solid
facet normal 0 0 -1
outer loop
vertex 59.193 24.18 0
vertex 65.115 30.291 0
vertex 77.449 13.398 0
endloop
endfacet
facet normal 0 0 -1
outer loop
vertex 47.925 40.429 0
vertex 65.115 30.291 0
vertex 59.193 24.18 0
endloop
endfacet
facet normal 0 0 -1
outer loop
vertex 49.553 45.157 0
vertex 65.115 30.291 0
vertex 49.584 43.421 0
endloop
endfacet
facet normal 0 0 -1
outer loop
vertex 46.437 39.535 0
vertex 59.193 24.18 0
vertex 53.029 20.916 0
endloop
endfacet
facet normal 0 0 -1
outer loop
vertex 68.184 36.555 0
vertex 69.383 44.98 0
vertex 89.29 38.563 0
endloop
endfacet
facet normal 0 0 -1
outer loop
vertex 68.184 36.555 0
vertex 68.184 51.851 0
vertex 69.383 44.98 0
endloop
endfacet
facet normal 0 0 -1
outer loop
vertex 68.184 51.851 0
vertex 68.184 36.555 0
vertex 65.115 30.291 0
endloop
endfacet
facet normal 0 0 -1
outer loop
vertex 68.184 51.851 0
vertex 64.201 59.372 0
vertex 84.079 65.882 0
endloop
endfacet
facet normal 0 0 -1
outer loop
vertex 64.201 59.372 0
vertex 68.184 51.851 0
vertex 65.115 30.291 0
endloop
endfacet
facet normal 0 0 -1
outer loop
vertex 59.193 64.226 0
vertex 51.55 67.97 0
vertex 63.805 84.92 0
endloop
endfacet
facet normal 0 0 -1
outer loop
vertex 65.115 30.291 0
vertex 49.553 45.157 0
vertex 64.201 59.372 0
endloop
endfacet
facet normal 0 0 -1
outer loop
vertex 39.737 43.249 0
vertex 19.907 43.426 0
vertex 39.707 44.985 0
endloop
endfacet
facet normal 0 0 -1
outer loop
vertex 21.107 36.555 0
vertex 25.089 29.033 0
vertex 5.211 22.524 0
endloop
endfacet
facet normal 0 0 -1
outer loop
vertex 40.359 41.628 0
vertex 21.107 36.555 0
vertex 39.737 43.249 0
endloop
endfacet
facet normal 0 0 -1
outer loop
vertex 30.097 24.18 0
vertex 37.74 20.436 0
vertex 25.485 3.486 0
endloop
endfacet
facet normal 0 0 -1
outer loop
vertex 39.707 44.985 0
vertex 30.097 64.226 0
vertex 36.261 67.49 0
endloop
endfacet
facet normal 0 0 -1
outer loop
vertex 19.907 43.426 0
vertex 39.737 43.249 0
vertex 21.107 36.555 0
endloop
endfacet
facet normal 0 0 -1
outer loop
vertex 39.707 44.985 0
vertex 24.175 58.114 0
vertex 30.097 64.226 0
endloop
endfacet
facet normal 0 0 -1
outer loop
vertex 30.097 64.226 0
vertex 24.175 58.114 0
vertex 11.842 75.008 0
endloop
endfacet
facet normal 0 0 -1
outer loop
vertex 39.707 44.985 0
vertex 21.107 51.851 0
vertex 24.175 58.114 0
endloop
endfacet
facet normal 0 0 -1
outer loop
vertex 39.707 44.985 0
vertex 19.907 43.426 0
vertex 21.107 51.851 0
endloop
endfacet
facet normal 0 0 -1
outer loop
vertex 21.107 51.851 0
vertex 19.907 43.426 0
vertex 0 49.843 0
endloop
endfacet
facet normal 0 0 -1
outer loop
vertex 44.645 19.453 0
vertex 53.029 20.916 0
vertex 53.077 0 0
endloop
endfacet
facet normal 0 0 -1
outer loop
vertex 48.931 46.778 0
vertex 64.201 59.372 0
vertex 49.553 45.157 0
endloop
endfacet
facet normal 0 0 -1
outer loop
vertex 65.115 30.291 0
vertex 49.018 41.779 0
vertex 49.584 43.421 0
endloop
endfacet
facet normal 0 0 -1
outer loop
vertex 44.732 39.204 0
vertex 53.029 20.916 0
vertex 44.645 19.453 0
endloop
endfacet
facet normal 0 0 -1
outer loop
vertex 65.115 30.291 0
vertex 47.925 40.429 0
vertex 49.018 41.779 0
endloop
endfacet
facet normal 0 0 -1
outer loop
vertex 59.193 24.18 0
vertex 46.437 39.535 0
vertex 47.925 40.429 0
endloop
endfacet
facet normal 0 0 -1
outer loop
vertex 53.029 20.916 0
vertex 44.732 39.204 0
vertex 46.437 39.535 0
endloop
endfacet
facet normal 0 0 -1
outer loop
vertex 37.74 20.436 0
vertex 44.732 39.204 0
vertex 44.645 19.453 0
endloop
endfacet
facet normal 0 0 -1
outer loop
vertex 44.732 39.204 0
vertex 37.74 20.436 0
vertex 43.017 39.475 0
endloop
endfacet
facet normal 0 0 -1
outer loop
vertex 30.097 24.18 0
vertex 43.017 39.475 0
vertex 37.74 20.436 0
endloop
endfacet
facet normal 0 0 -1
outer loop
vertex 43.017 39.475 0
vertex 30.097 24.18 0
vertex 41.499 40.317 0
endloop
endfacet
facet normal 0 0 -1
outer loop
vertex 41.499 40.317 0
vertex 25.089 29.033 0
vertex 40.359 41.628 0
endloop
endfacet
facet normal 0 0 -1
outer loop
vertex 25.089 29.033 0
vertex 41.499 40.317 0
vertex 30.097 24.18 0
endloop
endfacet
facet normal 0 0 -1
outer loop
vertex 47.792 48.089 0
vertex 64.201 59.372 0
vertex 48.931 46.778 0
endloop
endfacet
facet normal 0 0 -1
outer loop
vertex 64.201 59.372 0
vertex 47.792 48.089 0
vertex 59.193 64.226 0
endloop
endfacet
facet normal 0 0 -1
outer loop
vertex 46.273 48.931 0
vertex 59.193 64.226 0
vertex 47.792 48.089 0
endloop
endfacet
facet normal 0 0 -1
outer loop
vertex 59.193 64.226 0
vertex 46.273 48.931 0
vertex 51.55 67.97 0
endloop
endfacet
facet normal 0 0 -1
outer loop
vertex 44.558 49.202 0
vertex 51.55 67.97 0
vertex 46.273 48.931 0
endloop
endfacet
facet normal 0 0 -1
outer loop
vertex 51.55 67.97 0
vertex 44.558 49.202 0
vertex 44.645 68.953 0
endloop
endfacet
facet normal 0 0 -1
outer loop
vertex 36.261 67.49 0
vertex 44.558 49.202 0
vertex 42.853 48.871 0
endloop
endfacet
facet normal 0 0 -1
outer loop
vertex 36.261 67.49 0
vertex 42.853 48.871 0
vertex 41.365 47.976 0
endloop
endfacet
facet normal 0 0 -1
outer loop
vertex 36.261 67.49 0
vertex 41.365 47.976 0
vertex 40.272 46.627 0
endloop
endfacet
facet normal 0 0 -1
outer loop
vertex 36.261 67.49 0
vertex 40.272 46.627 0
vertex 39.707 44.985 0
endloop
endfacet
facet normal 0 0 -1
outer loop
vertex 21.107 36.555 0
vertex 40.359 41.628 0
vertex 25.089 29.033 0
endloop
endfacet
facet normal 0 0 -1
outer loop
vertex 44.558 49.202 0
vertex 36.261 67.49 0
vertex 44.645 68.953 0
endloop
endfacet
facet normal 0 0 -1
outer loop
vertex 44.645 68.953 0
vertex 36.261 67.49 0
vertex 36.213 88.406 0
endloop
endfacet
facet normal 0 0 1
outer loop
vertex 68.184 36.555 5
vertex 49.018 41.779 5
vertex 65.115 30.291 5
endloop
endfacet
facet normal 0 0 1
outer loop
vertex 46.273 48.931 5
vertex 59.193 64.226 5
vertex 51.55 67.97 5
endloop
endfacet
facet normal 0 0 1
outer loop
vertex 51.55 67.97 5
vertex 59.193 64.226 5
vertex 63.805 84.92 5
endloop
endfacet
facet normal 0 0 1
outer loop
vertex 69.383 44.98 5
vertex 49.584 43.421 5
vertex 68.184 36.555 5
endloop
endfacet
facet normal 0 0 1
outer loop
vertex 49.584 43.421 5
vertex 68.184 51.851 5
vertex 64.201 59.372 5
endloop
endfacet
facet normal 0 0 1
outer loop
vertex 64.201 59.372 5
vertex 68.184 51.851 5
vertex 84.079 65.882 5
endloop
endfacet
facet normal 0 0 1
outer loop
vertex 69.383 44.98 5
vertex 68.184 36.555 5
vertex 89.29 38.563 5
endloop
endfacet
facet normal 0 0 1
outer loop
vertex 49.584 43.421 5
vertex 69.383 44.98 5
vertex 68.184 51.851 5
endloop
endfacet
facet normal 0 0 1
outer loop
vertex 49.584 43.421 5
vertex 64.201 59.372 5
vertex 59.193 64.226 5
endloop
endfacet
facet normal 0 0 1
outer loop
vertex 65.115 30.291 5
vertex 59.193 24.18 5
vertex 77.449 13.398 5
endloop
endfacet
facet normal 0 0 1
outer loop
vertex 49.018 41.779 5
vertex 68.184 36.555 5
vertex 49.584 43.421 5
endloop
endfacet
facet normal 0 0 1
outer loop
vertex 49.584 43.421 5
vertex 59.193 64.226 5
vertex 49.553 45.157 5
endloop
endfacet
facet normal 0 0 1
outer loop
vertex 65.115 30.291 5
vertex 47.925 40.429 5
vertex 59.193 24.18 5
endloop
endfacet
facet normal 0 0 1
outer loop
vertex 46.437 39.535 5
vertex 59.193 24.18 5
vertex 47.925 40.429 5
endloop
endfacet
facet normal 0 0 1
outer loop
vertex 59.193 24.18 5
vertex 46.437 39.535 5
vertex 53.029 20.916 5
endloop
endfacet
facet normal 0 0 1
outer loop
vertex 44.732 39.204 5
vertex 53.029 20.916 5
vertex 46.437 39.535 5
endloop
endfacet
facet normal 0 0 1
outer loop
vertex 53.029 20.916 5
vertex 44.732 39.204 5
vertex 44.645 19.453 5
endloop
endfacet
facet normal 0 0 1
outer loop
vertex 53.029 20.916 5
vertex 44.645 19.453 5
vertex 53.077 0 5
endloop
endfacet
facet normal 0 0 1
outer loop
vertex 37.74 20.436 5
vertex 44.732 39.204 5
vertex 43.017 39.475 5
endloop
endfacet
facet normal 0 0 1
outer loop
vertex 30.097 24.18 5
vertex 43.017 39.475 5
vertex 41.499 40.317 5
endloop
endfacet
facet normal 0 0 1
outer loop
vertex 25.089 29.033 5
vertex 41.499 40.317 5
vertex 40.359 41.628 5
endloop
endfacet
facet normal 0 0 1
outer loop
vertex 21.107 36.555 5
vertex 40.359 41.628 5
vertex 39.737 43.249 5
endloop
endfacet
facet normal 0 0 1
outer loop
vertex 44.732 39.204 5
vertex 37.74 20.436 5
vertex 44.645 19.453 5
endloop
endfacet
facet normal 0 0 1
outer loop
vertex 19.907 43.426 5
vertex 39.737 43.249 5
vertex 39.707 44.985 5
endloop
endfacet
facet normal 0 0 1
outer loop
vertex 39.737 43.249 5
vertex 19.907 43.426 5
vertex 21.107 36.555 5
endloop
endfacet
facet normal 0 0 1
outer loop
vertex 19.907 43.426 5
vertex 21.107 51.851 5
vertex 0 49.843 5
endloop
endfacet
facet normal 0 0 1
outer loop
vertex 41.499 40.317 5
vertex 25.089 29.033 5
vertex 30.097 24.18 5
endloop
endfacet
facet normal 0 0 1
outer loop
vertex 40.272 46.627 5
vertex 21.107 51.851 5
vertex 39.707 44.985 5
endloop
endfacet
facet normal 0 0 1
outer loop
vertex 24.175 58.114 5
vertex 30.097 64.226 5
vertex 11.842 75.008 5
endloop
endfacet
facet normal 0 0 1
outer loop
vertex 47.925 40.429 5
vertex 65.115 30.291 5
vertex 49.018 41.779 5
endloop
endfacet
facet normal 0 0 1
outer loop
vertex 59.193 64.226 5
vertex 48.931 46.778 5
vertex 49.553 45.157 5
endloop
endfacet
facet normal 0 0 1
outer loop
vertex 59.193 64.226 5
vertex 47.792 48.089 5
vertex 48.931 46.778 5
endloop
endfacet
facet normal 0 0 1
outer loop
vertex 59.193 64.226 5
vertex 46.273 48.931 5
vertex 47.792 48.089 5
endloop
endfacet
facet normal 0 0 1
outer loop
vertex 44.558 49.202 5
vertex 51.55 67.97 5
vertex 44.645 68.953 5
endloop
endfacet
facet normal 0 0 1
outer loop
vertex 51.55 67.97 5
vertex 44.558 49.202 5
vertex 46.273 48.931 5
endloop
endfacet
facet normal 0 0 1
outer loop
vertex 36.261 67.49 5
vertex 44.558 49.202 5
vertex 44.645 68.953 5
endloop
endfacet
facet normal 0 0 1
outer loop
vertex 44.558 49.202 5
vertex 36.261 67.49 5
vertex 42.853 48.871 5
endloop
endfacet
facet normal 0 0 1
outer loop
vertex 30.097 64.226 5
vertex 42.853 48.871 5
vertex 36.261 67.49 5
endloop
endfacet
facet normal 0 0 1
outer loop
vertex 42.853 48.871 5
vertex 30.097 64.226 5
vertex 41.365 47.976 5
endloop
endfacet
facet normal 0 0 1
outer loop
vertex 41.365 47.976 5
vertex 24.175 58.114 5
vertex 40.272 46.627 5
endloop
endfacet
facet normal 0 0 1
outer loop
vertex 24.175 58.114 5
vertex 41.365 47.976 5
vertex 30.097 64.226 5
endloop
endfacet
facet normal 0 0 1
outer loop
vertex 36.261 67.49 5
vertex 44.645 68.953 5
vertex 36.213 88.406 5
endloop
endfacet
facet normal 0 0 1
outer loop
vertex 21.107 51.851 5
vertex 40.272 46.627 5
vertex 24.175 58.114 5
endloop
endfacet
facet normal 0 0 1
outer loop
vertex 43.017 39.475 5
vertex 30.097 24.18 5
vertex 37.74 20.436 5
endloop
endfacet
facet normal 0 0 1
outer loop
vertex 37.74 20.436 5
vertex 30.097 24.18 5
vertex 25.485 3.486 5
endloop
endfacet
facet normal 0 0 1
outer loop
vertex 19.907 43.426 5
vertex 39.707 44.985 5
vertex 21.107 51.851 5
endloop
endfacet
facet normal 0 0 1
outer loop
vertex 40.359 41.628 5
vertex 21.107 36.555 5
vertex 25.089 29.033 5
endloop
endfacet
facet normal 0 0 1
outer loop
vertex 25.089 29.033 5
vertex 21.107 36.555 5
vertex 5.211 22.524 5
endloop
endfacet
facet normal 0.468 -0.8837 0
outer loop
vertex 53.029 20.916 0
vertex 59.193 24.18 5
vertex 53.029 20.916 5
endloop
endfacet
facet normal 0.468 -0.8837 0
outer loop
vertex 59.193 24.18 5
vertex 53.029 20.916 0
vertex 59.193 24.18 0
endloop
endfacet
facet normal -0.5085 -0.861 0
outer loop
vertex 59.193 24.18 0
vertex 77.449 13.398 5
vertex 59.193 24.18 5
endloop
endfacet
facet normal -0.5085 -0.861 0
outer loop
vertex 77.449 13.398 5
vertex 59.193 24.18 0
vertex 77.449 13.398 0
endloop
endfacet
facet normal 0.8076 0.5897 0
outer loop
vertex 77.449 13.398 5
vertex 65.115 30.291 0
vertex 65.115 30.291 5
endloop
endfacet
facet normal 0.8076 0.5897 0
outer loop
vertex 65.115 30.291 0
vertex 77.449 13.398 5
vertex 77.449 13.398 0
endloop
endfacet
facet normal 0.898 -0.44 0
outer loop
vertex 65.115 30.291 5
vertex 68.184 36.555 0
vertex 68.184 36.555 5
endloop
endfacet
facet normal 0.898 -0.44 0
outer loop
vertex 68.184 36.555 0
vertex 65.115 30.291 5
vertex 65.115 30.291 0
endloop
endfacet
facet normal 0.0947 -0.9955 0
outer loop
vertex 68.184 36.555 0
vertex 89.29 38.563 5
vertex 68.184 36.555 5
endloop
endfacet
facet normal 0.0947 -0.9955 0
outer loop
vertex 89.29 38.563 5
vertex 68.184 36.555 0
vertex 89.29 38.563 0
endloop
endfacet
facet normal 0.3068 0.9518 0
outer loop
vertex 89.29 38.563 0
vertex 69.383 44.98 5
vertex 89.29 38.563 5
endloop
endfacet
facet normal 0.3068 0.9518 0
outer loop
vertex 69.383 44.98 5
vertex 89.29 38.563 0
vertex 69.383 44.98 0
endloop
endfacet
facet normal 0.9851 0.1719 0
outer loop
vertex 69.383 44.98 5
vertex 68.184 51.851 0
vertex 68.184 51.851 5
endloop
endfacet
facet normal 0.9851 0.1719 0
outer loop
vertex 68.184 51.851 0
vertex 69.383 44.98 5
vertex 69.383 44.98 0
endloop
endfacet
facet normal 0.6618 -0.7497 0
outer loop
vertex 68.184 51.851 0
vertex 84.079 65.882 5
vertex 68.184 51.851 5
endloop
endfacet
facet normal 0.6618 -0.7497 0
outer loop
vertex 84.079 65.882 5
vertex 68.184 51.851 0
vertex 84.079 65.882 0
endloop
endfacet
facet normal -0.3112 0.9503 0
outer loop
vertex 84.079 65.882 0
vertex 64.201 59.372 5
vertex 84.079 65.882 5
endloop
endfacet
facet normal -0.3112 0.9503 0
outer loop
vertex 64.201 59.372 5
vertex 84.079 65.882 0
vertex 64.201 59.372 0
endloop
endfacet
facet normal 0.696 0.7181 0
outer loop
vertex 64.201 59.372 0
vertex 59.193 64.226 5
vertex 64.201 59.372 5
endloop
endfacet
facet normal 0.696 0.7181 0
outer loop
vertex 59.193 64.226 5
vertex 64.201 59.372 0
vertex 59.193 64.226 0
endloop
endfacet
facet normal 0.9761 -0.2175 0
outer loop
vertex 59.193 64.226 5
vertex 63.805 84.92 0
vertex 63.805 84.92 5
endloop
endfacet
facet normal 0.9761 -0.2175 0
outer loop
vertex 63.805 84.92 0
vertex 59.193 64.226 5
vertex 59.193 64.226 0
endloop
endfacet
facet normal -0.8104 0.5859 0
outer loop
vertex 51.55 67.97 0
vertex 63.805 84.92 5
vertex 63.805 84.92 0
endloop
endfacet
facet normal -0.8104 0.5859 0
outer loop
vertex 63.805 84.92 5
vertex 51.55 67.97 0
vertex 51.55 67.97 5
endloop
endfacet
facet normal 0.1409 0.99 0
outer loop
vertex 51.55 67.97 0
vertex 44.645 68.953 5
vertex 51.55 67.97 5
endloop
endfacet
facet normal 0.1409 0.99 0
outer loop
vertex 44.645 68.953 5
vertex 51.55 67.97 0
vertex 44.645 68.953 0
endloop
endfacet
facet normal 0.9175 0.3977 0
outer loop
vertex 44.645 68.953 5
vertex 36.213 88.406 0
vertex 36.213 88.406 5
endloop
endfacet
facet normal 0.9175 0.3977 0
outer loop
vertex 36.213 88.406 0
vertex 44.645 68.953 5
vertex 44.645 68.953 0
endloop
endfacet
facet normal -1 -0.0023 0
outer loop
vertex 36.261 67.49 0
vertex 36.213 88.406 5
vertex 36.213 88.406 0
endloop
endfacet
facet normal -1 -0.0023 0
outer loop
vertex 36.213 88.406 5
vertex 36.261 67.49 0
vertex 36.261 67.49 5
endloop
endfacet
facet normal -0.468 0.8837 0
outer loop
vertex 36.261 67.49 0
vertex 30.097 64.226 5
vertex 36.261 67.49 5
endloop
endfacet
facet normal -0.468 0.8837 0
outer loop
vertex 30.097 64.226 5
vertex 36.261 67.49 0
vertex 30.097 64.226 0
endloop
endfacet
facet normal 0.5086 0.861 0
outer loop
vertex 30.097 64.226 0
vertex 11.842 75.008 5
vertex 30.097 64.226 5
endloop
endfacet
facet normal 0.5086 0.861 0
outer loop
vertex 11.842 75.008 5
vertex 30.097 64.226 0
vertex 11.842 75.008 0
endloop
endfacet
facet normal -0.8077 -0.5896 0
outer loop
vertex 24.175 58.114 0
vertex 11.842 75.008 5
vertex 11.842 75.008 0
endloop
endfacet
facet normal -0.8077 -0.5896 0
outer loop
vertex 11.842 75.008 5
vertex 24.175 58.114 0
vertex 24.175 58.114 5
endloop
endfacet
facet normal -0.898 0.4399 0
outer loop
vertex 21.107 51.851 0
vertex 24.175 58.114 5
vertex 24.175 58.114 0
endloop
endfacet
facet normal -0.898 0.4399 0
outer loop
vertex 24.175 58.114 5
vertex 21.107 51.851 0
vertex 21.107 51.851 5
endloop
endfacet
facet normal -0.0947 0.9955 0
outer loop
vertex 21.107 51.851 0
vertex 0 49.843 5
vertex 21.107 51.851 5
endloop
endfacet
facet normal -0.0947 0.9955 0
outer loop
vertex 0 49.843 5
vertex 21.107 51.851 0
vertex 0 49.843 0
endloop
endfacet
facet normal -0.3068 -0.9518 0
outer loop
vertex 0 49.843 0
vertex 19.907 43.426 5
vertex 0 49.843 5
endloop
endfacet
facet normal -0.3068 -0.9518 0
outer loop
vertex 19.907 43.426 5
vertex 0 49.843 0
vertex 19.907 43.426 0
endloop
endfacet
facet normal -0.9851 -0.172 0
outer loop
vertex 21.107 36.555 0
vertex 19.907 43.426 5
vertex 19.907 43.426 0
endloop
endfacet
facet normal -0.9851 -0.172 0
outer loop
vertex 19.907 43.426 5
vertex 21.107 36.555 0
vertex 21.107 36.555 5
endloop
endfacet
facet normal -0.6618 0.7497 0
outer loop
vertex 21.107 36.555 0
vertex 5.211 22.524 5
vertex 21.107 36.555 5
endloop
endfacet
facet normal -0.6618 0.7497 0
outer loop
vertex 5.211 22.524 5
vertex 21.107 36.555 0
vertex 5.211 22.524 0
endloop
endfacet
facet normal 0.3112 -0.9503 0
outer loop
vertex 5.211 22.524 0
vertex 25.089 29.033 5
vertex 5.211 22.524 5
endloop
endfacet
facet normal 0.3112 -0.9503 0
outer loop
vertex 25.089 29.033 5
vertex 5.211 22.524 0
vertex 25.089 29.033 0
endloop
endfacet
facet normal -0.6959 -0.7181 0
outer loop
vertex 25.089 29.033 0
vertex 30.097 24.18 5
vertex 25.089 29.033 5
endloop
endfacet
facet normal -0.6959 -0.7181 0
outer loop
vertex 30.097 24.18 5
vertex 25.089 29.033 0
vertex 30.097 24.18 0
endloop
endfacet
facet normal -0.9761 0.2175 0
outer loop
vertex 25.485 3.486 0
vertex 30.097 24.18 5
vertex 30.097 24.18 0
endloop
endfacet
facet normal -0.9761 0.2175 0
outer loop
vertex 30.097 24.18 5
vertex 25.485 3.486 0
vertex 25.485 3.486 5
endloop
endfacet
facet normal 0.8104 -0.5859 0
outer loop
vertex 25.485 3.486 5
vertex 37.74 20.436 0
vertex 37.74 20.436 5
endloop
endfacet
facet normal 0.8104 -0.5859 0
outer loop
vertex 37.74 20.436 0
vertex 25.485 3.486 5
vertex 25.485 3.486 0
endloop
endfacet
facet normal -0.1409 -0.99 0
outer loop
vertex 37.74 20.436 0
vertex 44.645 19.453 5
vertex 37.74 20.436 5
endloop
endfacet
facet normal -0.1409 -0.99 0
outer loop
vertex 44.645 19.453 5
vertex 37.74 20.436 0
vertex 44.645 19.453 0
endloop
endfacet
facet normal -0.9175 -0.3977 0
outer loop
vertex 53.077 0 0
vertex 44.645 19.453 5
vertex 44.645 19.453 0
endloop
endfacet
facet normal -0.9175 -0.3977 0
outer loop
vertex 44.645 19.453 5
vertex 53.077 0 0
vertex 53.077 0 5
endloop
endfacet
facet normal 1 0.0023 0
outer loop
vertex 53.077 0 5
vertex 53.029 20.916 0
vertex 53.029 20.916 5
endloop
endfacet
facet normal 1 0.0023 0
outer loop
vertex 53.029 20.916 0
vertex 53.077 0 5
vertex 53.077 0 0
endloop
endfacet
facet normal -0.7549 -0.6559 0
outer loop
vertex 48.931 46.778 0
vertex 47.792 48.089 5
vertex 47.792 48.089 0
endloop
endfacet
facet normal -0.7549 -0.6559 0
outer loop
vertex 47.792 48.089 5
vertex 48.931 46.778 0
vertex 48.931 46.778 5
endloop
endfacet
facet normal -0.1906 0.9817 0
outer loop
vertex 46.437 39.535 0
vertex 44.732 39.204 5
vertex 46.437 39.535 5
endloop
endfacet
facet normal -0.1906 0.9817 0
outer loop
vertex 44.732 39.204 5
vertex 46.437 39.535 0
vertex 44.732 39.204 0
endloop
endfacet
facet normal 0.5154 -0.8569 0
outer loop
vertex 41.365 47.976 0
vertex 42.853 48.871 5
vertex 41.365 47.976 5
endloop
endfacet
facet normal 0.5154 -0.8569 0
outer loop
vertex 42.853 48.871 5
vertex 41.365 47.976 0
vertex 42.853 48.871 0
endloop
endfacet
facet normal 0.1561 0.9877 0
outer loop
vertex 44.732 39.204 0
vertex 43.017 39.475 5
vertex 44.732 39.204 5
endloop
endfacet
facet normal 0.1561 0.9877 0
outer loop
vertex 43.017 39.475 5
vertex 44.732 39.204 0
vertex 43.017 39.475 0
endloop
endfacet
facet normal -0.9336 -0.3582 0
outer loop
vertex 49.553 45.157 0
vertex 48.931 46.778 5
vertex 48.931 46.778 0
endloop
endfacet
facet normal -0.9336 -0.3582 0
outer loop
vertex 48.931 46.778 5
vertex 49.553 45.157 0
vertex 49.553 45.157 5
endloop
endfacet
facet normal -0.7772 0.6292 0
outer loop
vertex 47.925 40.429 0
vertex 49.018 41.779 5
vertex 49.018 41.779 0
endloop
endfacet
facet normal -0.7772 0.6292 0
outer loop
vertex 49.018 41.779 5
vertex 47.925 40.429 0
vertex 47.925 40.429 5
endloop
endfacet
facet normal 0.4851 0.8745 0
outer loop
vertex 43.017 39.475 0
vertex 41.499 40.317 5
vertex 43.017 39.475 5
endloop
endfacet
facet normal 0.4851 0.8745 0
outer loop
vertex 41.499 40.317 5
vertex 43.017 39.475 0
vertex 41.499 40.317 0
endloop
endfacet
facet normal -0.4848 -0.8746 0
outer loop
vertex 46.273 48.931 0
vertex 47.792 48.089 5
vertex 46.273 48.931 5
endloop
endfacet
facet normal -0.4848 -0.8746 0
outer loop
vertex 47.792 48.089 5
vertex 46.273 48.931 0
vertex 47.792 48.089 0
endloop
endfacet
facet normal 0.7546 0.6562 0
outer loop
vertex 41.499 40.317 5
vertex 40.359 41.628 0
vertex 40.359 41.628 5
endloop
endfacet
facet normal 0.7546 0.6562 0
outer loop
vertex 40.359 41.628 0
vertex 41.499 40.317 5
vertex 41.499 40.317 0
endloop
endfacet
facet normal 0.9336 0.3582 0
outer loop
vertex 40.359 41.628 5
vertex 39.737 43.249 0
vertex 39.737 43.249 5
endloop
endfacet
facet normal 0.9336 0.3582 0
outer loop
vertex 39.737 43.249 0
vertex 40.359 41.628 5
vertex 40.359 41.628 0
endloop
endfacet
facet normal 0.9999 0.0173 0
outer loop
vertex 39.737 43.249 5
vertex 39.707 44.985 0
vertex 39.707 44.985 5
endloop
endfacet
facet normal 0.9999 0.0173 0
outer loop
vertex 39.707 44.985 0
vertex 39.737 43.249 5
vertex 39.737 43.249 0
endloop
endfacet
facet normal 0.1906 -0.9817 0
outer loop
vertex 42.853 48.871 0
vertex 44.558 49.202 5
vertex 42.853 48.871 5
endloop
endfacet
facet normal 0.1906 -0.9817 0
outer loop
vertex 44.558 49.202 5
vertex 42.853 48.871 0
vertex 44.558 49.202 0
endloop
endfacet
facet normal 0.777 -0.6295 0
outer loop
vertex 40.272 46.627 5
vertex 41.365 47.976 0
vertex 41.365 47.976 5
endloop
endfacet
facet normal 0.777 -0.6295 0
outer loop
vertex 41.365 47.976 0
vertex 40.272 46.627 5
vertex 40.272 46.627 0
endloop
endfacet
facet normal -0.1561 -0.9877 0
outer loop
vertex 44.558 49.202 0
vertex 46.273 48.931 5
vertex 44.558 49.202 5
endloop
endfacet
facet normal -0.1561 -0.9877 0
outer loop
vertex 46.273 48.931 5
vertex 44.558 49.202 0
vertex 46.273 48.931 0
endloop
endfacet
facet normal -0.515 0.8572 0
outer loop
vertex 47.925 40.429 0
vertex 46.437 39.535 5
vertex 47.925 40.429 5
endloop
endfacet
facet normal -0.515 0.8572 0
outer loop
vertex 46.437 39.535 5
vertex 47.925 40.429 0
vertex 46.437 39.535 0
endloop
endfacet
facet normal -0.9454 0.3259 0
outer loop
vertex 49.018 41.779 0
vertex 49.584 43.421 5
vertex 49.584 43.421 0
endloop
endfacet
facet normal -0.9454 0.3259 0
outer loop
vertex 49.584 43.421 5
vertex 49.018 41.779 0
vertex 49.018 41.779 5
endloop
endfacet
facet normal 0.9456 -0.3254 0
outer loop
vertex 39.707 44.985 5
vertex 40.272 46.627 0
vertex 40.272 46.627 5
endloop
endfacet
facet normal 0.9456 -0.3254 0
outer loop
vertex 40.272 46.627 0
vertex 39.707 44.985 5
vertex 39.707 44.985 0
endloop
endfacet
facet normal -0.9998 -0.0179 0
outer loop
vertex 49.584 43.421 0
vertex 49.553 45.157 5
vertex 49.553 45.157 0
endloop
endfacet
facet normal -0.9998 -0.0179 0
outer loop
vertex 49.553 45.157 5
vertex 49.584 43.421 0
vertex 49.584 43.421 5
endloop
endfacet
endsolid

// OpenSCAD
$fn = 32;

// ----------------------------------------------------------------------
// Star wheel: 10-point ratchet, R45
// ----------------------------------------------------------------------

// --- parameters (mm) ---
n_points = 10;            // number of points / teeth
r_out = 45;               // tip radius
r_in = 24.75;             // root radius
bore_r = 5;               // centre bore radius
plate_t = 5;              // plate thickness, Z (extrusion height)
bore_d = 10;              // centre bore diameter

profile = [[44.645, 68.953], [36.213, 88.406], [36.261, 67.49], [30.097, 64.226], [11.842, 75.008], [24.175, 58.114], [21.107, 51.851], [0, 49.843], [19.907, 43.426], [21.107, 36.555], [5.211, 22.524], [25.089, 29.033], [30.097, 24.18], [25.485, 3.486], [37.74, 20.436], [44.645, 19.453], [53.077, 0], [53.029, 20.916], [59.193, 24.18], [77.449, 13.398], [65.115, 30.291], [68.184, 36.555], [89.29, 38.563], [69.383, 44.98], [68.184, 51.851], [84.079, 65.882], [64.201, 59.372], [59.193, 64.226], [63.805, 84.92], [51.55, 67.97]];  // primary outline, 30 points, counter clockwise
void_1 = [[49.553, 45.157], [48.931, 46.778], [47.792, 48.089], [46.273, 48.931], [44.558, 49.202], [42.853, 48.871], [41.365, 47.976], [40.272, 46.627], [39.707, 44.985], [39.737, 43.249], [40.359, 41.628], [41.499, 40.317], [43.017, 39.475], [44.732, 39.204], [46.437, 39.535], [47.925, 40.429], [49.018, 41.779], [49.584, 43.421]];  // centre bore, 18 points

// --- the one profile operation ---
difference() {
  linear_extrude(height = plate_t) polygon(points = profile);
  translate([0, 0, -1])
    linear_extrude(height = plate_t + 2) polygon(points = void_1);
}
